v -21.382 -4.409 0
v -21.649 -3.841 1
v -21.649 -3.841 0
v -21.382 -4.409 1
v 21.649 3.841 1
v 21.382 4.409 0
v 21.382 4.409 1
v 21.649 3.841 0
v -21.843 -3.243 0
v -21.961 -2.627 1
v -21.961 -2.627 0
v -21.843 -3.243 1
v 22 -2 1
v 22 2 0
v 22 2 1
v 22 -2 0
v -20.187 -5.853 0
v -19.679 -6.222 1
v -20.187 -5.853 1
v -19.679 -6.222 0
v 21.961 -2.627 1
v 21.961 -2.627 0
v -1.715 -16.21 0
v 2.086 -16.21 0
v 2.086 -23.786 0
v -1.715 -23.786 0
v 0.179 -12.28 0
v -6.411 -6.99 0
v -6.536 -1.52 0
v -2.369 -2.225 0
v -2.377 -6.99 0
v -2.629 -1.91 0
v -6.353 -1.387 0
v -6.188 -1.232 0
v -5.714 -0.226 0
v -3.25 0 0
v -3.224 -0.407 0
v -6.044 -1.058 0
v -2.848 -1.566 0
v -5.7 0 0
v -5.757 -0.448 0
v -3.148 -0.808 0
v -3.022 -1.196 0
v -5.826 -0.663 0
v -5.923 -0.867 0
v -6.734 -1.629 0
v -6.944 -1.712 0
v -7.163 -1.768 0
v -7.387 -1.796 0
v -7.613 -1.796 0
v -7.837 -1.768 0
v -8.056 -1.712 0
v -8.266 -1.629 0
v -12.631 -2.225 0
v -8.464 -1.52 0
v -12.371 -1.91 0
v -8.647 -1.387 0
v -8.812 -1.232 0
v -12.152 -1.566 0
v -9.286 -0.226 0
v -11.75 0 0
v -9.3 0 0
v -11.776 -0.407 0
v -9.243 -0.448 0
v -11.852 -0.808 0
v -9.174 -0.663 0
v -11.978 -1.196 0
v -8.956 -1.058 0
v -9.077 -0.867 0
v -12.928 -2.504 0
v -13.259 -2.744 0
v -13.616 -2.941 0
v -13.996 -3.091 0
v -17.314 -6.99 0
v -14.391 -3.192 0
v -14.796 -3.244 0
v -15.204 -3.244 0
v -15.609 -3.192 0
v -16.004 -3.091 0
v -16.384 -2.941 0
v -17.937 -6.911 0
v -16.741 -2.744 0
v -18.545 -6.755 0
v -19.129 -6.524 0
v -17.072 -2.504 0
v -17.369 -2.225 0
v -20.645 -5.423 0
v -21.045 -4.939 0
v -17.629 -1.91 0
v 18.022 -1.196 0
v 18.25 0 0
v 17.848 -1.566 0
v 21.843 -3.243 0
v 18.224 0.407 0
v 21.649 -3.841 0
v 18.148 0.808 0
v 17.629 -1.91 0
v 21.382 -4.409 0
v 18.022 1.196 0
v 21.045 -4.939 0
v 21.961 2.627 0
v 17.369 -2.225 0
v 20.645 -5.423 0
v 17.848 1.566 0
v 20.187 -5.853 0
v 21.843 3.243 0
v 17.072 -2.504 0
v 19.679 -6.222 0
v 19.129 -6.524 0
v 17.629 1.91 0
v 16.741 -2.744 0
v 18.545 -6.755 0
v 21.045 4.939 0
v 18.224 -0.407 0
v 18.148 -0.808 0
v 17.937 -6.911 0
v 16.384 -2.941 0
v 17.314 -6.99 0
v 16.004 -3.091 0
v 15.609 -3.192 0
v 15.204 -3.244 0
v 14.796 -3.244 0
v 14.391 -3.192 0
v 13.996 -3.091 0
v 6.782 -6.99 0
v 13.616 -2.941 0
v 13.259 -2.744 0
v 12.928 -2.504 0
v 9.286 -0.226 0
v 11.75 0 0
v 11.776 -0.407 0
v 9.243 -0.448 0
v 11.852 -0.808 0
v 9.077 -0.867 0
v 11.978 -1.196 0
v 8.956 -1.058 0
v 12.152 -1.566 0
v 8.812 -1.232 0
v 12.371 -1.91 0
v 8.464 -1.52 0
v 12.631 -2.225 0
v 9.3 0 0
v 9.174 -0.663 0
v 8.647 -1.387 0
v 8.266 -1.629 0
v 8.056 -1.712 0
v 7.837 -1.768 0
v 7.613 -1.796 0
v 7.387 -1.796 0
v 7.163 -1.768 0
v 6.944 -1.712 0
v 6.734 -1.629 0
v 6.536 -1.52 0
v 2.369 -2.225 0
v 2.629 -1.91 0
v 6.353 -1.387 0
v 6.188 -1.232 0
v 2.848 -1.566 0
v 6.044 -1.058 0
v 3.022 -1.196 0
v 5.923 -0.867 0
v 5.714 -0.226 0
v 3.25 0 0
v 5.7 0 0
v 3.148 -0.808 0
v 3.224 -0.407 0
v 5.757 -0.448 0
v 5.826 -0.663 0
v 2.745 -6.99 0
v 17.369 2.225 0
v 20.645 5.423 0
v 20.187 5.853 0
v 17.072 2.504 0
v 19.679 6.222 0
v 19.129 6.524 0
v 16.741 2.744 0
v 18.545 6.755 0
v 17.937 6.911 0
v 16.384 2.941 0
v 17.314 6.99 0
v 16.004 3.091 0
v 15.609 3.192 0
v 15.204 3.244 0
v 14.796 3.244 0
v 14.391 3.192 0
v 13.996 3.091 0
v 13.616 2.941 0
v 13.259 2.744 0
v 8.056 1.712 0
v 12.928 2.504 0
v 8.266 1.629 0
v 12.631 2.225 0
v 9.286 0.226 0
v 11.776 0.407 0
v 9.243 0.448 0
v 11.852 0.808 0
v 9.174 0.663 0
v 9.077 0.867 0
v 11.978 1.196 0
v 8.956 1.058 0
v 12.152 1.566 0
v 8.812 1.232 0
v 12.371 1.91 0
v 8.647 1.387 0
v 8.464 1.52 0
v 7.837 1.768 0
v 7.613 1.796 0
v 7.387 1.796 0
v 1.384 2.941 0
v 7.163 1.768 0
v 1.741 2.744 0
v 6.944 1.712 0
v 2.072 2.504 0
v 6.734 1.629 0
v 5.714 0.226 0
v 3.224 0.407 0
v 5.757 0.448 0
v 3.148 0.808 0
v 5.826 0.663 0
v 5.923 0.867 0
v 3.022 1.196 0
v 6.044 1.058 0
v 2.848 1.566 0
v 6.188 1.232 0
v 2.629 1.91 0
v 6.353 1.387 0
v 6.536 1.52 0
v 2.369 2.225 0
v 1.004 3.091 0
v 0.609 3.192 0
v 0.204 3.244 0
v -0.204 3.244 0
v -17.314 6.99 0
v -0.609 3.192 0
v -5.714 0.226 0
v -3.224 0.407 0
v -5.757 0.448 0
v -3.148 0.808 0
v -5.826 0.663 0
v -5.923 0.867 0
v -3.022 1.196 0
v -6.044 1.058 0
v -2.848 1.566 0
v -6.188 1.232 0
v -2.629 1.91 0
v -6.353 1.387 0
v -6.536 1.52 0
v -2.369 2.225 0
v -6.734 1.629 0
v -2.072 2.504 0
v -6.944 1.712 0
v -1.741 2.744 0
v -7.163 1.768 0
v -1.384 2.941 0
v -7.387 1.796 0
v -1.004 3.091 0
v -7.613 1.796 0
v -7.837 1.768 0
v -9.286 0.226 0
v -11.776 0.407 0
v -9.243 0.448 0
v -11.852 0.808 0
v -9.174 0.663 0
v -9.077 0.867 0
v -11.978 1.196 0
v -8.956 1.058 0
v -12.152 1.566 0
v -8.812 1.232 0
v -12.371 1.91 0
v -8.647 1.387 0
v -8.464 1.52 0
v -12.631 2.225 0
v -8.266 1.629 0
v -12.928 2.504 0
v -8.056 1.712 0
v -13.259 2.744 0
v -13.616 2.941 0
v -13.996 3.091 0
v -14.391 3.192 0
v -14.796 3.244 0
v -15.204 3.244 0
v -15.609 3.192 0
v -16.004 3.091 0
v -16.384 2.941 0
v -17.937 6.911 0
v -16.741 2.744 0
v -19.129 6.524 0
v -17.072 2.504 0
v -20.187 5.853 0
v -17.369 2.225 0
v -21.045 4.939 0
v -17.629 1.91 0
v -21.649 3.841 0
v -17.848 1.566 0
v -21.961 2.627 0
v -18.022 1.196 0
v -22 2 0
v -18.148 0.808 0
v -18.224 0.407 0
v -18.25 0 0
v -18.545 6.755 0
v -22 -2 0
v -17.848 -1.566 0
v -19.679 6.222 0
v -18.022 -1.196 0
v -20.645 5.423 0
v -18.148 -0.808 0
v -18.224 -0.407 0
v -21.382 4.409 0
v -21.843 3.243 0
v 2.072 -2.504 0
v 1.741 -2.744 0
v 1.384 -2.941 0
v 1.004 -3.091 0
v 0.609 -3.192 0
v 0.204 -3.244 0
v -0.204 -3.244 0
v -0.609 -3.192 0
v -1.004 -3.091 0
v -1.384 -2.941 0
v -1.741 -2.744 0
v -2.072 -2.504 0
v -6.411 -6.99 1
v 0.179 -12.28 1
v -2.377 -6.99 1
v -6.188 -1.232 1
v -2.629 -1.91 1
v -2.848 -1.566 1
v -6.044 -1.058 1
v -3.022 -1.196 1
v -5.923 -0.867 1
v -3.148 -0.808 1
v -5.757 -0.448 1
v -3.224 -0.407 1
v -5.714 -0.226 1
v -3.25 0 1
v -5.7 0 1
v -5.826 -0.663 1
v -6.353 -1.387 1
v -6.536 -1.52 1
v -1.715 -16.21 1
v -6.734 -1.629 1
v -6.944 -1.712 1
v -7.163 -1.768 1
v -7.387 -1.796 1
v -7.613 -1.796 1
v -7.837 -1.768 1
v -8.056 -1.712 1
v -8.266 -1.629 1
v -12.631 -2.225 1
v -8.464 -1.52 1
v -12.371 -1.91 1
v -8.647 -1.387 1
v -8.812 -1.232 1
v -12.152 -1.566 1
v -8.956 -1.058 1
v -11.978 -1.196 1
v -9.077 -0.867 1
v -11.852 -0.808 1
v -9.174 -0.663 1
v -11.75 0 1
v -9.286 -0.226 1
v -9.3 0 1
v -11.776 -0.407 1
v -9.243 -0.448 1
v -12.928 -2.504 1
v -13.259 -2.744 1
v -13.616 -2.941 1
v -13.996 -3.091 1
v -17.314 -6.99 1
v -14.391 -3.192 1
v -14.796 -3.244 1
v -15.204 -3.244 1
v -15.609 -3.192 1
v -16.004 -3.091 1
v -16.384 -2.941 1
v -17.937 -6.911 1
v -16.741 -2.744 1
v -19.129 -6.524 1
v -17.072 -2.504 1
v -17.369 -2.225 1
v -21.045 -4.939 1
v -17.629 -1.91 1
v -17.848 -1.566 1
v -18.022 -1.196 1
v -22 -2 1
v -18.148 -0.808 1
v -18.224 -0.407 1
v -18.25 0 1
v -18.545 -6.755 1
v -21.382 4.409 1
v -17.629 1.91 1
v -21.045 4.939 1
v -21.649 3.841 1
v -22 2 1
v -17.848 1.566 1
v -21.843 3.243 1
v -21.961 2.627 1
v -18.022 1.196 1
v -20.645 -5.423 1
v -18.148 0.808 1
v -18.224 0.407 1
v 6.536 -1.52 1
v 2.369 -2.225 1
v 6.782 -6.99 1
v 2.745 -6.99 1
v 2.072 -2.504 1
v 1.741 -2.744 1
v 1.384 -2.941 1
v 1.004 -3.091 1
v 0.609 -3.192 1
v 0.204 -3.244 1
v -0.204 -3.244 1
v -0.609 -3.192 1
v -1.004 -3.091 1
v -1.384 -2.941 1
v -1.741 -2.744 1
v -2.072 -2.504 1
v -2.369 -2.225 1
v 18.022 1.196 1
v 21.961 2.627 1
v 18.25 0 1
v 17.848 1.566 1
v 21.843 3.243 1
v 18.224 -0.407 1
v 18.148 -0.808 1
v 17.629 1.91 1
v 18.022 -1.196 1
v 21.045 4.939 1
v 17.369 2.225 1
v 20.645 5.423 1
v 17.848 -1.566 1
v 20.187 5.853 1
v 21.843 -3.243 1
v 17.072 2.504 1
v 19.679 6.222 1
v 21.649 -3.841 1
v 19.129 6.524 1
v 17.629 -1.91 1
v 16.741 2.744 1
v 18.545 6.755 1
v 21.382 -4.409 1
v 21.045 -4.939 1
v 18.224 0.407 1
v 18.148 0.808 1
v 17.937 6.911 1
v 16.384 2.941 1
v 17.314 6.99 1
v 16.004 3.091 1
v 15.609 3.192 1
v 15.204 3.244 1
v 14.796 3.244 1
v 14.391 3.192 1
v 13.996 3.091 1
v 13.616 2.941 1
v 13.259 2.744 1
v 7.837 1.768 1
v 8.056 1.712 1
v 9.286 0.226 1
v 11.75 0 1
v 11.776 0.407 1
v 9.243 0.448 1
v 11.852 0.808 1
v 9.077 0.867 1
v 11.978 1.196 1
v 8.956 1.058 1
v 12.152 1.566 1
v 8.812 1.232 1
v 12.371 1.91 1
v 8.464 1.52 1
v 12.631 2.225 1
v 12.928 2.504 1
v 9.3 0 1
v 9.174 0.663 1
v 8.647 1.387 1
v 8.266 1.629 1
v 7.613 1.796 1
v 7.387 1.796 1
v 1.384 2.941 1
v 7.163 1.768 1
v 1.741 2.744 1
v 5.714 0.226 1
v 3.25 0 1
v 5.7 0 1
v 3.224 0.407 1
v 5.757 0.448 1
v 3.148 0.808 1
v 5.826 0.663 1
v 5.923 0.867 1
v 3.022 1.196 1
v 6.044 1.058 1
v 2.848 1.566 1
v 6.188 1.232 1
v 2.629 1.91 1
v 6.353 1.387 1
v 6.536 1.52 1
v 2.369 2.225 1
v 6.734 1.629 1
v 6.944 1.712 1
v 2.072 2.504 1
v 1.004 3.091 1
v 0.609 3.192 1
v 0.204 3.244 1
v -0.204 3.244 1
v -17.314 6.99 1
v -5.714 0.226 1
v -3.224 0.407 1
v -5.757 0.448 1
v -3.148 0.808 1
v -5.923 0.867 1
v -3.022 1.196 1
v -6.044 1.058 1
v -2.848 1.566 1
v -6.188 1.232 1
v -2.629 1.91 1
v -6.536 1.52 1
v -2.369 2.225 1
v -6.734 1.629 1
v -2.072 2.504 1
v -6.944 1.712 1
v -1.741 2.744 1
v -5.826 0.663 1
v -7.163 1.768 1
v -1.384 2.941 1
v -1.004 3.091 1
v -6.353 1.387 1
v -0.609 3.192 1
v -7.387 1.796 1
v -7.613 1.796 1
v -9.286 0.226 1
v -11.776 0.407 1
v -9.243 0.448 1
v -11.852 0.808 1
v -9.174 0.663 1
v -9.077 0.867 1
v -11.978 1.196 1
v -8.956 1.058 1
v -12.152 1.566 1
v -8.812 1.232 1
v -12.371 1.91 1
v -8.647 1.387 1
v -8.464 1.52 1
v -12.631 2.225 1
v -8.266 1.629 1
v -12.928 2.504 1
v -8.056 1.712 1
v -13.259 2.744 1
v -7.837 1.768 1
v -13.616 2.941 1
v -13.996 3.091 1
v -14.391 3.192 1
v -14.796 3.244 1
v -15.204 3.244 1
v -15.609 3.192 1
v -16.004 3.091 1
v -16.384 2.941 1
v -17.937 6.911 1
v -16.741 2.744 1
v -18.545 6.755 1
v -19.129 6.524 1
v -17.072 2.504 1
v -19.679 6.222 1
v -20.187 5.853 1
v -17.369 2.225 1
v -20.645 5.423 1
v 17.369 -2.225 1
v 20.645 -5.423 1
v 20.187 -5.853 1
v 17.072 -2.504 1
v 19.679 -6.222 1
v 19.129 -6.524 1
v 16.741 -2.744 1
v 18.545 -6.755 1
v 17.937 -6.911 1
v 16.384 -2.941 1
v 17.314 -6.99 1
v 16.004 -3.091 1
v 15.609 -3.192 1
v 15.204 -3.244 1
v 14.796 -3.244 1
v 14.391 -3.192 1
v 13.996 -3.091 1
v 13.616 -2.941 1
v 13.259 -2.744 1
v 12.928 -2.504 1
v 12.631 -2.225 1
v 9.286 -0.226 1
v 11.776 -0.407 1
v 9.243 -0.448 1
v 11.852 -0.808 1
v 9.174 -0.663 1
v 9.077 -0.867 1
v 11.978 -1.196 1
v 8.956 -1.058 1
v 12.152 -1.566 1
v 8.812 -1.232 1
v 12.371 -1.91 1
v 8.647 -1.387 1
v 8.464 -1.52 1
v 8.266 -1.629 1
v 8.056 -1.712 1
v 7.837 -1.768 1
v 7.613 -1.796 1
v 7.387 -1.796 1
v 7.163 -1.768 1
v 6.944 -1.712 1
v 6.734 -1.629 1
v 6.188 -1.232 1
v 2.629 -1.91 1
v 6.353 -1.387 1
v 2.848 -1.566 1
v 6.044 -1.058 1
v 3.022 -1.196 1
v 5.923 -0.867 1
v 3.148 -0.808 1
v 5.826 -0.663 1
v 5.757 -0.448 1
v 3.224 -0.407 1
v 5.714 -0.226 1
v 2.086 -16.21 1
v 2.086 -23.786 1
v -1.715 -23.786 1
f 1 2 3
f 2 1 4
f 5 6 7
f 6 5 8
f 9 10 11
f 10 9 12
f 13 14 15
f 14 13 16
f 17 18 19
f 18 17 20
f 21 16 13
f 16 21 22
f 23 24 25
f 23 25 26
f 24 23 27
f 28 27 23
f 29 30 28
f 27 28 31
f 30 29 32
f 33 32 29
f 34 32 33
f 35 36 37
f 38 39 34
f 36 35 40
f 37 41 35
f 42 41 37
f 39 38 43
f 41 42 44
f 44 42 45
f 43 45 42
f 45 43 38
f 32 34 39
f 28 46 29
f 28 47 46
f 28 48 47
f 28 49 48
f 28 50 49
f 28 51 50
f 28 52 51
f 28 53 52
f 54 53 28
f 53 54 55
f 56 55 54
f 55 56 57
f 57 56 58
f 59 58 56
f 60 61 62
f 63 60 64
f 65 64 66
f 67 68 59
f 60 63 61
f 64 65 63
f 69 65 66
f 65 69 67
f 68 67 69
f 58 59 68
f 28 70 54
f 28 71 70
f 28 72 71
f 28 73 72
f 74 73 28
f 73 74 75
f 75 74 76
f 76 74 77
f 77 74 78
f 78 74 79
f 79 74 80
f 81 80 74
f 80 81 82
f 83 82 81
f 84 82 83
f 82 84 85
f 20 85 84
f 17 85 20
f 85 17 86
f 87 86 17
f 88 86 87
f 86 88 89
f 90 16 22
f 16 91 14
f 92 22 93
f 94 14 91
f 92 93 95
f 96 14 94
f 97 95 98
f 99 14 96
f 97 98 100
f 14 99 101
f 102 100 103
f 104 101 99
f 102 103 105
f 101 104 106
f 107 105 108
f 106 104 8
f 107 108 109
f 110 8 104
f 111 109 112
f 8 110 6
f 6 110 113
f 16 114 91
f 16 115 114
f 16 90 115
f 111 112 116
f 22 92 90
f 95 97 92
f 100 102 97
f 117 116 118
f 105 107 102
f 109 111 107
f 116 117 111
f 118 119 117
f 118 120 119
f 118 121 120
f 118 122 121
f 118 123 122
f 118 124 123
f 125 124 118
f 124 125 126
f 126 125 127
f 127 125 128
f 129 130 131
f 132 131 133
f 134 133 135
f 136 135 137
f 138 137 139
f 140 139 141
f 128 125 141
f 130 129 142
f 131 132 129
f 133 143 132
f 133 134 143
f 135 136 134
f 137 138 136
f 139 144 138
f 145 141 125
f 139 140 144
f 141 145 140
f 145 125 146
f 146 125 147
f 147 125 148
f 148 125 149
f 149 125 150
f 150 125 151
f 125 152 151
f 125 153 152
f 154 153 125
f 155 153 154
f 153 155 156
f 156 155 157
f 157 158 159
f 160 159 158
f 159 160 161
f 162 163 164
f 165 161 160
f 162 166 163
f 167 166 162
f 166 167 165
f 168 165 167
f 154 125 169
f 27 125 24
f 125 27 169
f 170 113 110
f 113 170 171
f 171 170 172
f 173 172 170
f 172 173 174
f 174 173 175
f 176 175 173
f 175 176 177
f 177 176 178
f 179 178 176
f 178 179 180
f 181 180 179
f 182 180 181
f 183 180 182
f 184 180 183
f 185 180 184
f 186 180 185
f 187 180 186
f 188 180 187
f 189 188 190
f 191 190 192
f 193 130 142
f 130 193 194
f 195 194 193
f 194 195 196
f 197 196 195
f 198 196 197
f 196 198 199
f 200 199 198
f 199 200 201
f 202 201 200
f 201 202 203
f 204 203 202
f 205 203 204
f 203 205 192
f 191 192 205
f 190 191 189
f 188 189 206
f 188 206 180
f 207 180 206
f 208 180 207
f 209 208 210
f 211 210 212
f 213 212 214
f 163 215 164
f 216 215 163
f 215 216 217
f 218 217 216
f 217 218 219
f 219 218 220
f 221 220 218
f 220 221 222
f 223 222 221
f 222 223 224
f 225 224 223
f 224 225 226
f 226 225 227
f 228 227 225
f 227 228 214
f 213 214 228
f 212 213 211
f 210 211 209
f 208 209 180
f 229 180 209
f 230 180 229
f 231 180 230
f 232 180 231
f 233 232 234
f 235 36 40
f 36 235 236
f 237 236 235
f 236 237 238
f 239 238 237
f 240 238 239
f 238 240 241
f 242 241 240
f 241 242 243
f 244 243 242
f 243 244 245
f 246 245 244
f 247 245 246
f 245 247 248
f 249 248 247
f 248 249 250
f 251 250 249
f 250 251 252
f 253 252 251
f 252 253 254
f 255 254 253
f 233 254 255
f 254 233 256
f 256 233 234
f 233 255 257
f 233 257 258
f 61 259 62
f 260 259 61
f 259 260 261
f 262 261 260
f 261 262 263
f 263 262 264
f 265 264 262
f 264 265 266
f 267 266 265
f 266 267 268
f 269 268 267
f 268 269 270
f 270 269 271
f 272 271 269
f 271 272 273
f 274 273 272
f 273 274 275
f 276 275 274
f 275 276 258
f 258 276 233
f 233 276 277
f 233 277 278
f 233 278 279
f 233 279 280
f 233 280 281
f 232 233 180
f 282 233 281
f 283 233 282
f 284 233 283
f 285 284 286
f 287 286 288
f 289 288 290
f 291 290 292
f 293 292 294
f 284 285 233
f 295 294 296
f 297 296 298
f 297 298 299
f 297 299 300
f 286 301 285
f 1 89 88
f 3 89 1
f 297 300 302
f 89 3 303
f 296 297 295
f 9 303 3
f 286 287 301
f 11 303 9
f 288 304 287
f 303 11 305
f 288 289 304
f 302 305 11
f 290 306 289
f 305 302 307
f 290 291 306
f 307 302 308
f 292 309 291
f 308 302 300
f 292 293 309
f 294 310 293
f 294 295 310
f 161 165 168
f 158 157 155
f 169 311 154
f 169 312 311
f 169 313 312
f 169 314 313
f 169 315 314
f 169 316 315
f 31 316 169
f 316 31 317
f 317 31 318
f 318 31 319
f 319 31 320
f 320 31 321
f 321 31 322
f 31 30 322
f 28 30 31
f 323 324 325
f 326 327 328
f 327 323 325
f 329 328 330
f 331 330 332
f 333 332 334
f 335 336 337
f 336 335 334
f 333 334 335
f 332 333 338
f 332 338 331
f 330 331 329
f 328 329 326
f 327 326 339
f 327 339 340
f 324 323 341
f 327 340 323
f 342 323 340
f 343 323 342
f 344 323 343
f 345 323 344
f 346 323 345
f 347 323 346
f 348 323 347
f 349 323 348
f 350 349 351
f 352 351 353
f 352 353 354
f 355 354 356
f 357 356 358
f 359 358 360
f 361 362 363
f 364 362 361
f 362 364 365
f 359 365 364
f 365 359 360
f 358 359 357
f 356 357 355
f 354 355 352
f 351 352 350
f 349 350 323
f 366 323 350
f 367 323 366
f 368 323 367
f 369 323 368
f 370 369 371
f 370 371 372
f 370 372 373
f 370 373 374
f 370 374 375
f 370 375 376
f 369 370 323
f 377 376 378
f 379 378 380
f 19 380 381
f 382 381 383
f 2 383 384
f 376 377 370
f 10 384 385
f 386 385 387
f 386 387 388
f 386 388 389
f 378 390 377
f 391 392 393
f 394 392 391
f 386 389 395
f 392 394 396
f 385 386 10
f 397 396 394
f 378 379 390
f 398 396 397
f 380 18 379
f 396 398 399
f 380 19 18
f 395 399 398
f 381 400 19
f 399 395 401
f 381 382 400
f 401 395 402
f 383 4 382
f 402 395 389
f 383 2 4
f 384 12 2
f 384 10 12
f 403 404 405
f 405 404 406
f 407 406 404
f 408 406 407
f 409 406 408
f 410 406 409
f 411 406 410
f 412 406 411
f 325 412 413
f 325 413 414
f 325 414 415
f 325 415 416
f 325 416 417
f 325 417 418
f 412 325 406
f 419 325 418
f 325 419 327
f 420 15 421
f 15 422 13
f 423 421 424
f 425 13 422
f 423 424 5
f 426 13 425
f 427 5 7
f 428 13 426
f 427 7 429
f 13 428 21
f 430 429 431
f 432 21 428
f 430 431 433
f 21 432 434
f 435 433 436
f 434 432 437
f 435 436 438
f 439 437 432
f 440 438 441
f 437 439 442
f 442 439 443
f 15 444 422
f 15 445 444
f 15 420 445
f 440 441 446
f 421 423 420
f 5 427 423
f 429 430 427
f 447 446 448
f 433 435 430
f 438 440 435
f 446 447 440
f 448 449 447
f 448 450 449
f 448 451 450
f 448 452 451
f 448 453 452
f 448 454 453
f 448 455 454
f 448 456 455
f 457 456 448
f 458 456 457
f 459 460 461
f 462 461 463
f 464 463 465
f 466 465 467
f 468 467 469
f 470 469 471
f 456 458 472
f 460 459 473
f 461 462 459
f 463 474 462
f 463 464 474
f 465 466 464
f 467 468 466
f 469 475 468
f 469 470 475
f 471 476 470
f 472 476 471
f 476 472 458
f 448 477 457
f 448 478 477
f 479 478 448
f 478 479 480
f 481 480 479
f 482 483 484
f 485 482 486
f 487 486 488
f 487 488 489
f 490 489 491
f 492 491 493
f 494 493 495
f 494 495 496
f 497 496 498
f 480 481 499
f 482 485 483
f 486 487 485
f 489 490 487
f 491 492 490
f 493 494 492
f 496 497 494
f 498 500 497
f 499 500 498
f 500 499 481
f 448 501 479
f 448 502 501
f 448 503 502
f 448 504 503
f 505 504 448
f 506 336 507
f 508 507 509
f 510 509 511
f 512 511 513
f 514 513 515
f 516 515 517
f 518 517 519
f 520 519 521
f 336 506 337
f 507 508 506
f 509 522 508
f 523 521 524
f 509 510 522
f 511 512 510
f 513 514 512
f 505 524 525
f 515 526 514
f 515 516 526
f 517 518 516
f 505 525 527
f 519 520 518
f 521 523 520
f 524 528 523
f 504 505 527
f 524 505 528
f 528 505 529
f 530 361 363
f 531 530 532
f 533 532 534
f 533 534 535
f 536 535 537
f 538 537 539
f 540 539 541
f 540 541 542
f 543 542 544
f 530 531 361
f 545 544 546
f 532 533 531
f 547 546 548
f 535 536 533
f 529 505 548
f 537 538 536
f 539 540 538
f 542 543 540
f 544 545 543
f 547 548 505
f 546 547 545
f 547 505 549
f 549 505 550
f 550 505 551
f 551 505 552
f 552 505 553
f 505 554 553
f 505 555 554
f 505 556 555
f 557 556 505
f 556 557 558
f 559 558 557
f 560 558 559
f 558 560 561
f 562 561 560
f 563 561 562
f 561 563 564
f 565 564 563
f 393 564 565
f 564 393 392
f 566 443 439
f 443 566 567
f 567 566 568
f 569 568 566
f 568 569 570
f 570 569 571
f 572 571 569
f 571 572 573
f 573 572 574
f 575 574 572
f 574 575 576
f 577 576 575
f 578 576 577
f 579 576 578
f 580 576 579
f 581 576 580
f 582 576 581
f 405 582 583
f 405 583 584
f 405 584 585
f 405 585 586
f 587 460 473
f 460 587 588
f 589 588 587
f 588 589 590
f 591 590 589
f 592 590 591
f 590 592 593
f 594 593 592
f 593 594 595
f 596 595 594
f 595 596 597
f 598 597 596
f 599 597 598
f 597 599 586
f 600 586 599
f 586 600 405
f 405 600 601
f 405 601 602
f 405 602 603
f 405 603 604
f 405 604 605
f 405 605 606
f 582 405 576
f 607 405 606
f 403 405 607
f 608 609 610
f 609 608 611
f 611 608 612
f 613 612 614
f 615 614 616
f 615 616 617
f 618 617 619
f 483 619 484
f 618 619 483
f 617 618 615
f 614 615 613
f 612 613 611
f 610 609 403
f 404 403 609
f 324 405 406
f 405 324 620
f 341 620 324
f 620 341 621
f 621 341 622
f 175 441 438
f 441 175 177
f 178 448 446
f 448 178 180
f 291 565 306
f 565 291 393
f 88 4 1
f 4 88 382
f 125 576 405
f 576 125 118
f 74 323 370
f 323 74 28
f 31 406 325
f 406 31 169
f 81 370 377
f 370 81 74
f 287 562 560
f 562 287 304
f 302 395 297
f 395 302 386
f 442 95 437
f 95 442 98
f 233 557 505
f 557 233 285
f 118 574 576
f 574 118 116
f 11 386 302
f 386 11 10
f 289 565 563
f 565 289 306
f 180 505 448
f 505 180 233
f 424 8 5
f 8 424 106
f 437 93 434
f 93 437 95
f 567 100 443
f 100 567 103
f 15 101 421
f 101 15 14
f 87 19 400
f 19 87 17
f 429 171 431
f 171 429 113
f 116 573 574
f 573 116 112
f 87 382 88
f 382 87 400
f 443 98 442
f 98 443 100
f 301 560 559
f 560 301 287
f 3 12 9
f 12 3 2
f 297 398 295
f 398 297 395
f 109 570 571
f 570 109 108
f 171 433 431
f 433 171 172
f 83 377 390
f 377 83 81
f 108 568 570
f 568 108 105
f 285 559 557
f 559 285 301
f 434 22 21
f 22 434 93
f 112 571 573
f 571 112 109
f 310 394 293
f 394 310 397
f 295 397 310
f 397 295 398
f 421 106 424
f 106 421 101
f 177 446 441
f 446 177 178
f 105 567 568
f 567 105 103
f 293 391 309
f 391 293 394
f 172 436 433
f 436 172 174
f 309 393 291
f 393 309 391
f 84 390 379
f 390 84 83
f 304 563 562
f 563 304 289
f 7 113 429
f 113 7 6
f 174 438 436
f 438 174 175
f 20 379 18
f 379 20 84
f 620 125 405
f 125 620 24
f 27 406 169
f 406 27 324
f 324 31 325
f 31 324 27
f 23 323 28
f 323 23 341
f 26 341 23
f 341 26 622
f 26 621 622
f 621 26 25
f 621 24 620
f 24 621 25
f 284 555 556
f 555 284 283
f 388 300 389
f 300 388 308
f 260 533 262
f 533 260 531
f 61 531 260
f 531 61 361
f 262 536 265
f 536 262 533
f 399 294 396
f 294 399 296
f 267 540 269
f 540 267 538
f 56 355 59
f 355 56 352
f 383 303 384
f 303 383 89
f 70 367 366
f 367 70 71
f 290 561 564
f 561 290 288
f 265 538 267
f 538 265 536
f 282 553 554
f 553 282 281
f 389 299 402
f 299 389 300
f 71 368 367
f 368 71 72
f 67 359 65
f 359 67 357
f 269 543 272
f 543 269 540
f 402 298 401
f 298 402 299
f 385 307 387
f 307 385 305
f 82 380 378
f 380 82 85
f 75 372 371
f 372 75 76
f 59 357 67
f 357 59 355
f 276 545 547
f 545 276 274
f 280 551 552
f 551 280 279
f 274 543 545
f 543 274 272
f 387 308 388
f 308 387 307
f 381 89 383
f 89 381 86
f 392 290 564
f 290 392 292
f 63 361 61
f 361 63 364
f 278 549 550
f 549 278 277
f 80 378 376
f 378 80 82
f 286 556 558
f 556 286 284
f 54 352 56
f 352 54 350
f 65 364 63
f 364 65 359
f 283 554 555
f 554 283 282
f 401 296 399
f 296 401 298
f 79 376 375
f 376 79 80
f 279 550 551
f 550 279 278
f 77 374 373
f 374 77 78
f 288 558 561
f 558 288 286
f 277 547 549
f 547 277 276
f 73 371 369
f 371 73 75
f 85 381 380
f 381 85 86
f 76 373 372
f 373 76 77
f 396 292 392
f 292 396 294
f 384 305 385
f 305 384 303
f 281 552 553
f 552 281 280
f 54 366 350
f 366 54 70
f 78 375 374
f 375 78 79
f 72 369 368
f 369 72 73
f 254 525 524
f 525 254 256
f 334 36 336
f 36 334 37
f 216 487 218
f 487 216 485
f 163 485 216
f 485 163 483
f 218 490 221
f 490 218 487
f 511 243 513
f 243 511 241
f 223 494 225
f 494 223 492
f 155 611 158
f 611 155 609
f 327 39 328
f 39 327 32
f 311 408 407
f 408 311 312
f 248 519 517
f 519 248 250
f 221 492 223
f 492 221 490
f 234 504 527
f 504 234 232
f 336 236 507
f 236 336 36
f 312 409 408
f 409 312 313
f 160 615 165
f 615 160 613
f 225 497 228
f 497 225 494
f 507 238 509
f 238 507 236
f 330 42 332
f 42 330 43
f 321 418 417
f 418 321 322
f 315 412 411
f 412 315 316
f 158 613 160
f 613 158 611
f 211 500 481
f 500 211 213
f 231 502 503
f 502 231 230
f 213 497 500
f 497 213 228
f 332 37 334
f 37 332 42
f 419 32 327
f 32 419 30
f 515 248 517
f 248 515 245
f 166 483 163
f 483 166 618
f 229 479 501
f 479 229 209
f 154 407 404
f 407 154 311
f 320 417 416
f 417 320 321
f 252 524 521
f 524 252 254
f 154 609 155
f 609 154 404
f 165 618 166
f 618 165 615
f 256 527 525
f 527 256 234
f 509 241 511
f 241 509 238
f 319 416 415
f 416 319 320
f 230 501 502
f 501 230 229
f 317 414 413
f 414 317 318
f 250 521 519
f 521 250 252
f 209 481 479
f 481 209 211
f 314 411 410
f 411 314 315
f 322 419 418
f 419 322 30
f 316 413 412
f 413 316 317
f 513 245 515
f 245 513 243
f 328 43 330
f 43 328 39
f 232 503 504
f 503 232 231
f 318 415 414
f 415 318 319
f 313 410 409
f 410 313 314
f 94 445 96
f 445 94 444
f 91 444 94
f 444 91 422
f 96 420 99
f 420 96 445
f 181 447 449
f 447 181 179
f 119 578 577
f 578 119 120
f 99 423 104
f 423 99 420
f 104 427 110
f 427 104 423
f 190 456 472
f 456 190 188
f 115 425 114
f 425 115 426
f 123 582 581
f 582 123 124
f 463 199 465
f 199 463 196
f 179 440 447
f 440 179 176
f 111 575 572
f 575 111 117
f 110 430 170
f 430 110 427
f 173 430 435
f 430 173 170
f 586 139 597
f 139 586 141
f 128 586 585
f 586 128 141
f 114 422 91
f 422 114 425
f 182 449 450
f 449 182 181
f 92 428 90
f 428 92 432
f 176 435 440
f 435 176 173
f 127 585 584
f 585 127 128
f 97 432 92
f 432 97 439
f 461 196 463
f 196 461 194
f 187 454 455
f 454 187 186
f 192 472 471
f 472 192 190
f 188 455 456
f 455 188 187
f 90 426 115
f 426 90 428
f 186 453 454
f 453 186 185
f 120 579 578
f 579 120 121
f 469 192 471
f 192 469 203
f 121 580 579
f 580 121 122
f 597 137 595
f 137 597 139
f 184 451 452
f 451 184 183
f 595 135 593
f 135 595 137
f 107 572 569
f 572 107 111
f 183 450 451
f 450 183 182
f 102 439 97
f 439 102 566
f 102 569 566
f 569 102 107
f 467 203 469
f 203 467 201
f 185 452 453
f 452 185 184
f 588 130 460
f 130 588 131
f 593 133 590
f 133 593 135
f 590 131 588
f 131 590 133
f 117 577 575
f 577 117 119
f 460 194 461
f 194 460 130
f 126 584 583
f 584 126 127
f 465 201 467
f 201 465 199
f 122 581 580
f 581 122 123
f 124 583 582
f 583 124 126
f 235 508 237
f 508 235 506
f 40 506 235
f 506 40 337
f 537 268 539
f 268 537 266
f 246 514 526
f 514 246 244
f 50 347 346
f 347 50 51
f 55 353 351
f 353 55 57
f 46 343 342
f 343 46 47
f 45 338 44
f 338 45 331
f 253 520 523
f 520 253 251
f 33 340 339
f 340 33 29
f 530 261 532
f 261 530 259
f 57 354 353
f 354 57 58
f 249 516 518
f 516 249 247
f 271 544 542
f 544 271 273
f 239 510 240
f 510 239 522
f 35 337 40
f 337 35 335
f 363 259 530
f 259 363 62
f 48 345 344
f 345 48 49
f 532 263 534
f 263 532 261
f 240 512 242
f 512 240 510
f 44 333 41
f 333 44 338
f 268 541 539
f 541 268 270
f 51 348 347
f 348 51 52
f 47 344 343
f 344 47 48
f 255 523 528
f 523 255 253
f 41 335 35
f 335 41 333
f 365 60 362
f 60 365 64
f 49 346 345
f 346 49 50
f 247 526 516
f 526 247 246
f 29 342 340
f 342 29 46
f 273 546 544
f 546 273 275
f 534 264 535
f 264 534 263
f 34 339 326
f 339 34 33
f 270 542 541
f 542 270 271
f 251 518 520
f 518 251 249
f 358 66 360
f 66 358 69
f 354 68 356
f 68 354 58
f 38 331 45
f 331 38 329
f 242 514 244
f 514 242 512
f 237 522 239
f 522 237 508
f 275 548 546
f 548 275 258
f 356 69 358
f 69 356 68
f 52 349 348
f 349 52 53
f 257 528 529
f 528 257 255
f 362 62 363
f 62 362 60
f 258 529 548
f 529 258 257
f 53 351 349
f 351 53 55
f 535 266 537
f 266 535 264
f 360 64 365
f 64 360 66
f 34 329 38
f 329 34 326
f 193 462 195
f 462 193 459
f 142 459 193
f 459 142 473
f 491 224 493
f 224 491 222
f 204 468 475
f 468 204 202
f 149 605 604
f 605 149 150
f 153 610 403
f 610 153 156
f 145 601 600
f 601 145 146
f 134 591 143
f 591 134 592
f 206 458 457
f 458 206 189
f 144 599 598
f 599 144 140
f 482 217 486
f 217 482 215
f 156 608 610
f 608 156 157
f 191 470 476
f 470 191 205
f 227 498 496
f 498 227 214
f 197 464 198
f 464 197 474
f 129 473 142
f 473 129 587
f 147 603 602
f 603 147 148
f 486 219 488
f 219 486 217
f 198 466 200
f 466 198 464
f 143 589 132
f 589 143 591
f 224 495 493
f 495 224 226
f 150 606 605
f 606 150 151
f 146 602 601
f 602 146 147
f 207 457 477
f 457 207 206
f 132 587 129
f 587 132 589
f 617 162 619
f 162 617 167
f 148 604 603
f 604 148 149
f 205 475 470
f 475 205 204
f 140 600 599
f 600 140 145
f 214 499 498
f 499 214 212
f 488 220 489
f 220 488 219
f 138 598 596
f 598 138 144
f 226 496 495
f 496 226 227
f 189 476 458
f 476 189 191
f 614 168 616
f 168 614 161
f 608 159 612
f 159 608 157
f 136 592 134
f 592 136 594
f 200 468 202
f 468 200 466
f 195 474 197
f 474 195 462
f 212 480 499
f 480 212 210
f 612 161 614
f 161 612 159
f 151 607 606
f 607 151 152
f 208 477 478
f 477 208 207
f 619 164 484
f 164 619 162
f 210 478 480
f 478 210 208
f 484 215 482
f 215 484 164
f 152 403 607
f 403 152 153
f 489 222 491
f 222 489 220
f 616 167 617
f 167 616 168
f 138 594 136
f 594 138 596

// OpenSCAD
$fn = 50;


difference() {
	union() {
		hull() {
			translate(v = [-17.0000000000, 2.0000000000, 0]) {
				cylinder(h = 1, r = 5);
			}
			translate(v = [17.0000000000, 2.0000000000, 0]) {
				cylinder(h = 1, r = 5);
			}
			translate(v = [-17.0000000000, -2.0000000000, 0]) {
				cylinder(h = 1, r = 5);
			}
			translate(v = [17.0000000000, -2.0000000000, 0]) {
				cylinder(h = 1, r = 5);
			}
		}
		translate(v = [0, -5, 0]) {
			linear_extrude(height = 1) {
				text(font = "DejaVu Sans Mono:style=Bold", halign = "center", size = 19.0000000000, text = "Y", valign = "top");
			}
		}
	}
	union() {
		translate(v = [-15.0000000000, 0.0000000000, 0]) {
			translate(v = [0, 0, -100]) {
				cylinder(h = 200, r = 3.2500000000);
			}
		}
		translate(v = [0, 0, -100]) {
			cylinder(h = 200, r = 3.2500000000);
		}
		translate(v = [15.0000000000, 0.0000000000, 0]) {
			translate(v = [0, 0, -100]) {
				cylinder(h = 200, r = 3.2500000000);
			}
		}
		translate(v = [-15.0000000000, 0.0000000000, 0]) {
			translate(v = [0, 0, -100]) {
				cylinder(h = 200, r = 1.8000000000);
			}
		}
		translate(v = [-7.5000000000, 0.0000000000, 0]) {
			translate(v = [0, 0, -100]) {
				cylinder(h = 200, r = 1.8000000000);
			}
		}
		translate(v = [0, 0, -100]) {
			cylinder(h = 200, r = 1.8000000000);
		}
		translate(v = [7.5000000000, 0.0000000000, 0]) {
			translate(v = [0, 0, -100]) {
				cylinder(h = 200, r = 1.8000000000);
			}
		}
		translate(v = [15.0000000000, 0.0000000000, 0]) {
			translate(v = [0, 0, -100]) {
				cylinder(h = 200, r = 1.8000000000);
			}
		}
	}
}
